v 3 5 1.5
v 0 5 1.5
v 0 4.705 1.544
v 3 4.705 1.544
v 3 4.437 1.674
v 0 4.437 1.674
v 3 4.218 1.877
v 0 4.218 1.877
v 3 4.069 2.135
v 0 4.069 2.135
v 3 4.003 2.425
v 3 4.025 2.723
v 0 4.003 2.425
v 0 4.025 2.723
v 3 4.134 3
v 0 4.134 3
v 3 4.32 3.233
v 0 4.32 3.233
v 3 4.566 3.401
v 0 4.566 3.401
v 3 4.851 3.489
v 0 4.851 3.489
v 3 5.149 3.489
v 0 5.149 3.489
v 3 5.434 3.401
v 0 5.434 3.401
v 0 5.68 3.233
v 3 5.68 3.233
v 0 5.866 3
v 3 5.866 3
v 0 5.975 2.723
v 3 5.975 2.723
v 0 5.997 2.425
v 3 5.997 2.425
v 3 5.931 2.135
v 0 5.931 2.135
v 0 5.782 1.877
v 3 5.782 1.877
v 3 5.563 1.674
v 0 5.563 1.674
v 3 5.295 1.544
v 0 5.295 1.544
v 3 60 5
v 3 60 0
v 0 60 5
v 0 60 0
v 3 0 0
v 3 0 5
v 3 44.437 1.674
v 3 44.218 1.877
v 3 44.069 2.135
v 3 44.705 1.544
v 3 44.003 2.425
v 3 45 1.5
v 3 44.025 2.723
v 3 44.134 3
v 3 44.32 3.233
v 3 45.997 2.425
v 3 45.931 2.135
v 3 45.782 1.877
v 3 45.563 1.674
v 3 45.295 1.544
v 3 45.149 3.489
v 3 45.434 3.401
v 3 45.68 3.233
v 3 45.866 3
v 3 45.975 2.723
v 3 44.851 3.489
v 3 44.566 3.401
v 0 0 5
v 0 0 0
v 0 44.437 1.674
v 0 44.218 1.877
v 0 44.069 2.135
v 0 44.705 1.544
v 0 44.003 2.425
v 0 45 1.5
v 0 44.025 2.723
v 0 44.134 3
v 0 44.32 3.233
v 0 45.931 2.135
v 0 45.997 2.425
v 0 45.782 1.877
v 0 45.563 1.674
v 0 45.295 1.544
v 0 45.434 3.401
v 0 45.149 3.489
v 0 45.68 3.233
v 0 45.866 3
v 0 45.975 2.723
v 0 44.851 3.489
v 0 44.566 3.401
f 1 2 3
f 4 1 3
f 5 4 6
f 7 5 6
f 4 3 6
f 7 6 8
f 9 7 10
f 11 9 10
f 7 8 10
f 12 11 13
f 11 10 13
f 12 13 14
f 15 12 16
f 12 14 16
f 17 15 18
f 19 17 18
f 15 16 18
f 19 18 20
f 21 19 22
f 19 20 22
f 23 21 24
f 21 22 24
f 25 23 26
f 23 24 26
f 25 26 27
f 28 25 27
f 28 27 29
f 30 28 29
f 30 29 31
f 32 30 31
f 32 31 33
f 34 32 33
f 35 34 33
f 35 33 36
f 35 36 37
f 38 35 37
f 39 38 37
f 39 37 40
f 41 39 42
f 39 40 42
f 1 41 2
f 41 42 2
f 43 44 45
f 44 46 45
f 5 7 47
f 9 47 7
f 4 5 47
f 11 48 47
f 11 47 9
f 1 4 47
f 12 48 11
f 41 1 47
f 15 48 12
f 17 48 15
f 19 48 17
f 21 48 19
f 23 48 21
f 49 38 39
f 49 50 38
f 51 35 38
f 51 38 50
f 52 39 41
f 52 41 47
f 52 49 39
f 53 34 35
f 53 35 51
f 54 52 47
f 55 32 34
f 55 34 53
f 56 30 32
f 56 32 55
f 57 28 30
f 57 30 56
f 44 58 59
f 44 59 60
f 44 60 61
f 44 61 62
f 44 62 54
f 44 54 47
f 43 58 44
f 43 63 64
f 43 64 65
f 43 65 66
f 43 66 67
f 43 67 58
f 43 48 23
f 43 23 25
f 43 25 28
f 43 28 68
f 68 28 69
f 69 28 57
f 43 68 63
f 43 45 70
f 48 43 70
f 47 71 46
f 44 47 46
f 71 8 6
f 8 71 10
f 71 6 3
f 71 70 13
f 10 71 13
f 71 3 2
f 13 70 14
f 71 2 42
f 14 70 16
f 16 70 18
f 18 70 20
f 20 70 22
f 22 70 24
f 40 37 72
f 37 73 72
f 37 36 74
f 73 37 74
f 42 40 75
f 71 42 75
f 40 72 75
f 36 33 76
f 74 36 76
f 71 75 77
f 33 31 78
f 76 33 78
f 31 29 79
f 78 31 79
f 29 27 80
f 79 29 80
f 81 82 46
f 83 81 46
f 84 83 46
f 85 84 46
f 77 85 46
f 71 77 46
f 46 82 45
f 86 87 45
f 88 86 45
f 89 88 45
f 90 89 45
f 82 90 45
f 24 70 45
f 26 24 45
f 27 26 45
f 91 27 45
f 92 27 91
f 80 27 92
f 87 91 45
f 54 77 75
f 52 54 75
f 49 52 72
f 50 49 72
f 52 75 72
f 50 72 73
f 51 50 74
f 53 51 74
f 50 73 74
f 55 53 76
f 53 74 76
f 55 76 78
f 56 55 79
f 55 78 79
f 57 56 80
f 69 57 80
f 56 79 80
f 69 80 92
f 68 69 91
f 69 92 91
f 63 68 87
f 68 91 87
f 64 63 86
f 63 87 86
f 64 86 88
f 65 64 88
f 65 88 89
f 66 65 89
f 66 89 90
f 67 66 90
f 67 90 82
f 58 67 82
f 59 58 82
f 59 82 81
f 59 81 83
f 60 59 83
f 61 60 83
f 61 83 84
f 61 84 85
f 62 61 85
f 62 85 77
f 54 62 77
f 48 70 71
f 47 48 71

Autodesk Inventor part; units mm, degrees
ref_plane "YZ Plane" through (0, 0, 0) normal (1, 0, 0) x (0, 1, 0)
ref_plane "XZ Plane" through (0, 0, 0) normal (0, 1, 0) x (-1, 0, 0)
ref_plane "XY Plane" through (0, 0, 0) normal (0, 0, 1) x (1, 0, 0)
sketch "Sketch1" plane through (0, 0, 0) normal (1, 0, 0) x (0, 1, 0)
  line L0 (0, 0) -> (60, 0)
  line L1 (60, 0) -> (60, 5)
  line L2 (60, 5) -> (0, 5)
  line L3 (0, 5) -> (0, 0)
  dimension "d0" = 60
  dimension "d1" = 5
extrude "Extrusion1" add sketch "Sketch1" along normal blind 3
sketch "Sketch2" plane through (3, 0, 0) normal (1, 0, 0) x (0, 0, -1)
  line L0 (-5, 0) -> (0, 0) projected
  line L1 (-5, 60) -> (-5, 0) projected
  point P0 (-2.5, 5)
  dimension "d4" = 5
  dimension "d5" = 2.5
hole "Hole1" at (3, 5, 2.5) direction (-1, 0, 0) diameter 2 end through all
sketch "Sketch3" plane through (3, 0, 0) normal (1, 0, 0) x (0, 0, -1)
  line L0 (-5, 0) -> (0, 0) projected
  line L1 (-5, 60) -> (-5, 0) projected
  point P0 (-2.5, 45)
  dimension "d13" = 45
  dimension "d14" = 2.5
hole "Hole2" at (3, 45, 2.5) direction (-1, 0, 0) diameter 2 end through all
properties part number "support"
